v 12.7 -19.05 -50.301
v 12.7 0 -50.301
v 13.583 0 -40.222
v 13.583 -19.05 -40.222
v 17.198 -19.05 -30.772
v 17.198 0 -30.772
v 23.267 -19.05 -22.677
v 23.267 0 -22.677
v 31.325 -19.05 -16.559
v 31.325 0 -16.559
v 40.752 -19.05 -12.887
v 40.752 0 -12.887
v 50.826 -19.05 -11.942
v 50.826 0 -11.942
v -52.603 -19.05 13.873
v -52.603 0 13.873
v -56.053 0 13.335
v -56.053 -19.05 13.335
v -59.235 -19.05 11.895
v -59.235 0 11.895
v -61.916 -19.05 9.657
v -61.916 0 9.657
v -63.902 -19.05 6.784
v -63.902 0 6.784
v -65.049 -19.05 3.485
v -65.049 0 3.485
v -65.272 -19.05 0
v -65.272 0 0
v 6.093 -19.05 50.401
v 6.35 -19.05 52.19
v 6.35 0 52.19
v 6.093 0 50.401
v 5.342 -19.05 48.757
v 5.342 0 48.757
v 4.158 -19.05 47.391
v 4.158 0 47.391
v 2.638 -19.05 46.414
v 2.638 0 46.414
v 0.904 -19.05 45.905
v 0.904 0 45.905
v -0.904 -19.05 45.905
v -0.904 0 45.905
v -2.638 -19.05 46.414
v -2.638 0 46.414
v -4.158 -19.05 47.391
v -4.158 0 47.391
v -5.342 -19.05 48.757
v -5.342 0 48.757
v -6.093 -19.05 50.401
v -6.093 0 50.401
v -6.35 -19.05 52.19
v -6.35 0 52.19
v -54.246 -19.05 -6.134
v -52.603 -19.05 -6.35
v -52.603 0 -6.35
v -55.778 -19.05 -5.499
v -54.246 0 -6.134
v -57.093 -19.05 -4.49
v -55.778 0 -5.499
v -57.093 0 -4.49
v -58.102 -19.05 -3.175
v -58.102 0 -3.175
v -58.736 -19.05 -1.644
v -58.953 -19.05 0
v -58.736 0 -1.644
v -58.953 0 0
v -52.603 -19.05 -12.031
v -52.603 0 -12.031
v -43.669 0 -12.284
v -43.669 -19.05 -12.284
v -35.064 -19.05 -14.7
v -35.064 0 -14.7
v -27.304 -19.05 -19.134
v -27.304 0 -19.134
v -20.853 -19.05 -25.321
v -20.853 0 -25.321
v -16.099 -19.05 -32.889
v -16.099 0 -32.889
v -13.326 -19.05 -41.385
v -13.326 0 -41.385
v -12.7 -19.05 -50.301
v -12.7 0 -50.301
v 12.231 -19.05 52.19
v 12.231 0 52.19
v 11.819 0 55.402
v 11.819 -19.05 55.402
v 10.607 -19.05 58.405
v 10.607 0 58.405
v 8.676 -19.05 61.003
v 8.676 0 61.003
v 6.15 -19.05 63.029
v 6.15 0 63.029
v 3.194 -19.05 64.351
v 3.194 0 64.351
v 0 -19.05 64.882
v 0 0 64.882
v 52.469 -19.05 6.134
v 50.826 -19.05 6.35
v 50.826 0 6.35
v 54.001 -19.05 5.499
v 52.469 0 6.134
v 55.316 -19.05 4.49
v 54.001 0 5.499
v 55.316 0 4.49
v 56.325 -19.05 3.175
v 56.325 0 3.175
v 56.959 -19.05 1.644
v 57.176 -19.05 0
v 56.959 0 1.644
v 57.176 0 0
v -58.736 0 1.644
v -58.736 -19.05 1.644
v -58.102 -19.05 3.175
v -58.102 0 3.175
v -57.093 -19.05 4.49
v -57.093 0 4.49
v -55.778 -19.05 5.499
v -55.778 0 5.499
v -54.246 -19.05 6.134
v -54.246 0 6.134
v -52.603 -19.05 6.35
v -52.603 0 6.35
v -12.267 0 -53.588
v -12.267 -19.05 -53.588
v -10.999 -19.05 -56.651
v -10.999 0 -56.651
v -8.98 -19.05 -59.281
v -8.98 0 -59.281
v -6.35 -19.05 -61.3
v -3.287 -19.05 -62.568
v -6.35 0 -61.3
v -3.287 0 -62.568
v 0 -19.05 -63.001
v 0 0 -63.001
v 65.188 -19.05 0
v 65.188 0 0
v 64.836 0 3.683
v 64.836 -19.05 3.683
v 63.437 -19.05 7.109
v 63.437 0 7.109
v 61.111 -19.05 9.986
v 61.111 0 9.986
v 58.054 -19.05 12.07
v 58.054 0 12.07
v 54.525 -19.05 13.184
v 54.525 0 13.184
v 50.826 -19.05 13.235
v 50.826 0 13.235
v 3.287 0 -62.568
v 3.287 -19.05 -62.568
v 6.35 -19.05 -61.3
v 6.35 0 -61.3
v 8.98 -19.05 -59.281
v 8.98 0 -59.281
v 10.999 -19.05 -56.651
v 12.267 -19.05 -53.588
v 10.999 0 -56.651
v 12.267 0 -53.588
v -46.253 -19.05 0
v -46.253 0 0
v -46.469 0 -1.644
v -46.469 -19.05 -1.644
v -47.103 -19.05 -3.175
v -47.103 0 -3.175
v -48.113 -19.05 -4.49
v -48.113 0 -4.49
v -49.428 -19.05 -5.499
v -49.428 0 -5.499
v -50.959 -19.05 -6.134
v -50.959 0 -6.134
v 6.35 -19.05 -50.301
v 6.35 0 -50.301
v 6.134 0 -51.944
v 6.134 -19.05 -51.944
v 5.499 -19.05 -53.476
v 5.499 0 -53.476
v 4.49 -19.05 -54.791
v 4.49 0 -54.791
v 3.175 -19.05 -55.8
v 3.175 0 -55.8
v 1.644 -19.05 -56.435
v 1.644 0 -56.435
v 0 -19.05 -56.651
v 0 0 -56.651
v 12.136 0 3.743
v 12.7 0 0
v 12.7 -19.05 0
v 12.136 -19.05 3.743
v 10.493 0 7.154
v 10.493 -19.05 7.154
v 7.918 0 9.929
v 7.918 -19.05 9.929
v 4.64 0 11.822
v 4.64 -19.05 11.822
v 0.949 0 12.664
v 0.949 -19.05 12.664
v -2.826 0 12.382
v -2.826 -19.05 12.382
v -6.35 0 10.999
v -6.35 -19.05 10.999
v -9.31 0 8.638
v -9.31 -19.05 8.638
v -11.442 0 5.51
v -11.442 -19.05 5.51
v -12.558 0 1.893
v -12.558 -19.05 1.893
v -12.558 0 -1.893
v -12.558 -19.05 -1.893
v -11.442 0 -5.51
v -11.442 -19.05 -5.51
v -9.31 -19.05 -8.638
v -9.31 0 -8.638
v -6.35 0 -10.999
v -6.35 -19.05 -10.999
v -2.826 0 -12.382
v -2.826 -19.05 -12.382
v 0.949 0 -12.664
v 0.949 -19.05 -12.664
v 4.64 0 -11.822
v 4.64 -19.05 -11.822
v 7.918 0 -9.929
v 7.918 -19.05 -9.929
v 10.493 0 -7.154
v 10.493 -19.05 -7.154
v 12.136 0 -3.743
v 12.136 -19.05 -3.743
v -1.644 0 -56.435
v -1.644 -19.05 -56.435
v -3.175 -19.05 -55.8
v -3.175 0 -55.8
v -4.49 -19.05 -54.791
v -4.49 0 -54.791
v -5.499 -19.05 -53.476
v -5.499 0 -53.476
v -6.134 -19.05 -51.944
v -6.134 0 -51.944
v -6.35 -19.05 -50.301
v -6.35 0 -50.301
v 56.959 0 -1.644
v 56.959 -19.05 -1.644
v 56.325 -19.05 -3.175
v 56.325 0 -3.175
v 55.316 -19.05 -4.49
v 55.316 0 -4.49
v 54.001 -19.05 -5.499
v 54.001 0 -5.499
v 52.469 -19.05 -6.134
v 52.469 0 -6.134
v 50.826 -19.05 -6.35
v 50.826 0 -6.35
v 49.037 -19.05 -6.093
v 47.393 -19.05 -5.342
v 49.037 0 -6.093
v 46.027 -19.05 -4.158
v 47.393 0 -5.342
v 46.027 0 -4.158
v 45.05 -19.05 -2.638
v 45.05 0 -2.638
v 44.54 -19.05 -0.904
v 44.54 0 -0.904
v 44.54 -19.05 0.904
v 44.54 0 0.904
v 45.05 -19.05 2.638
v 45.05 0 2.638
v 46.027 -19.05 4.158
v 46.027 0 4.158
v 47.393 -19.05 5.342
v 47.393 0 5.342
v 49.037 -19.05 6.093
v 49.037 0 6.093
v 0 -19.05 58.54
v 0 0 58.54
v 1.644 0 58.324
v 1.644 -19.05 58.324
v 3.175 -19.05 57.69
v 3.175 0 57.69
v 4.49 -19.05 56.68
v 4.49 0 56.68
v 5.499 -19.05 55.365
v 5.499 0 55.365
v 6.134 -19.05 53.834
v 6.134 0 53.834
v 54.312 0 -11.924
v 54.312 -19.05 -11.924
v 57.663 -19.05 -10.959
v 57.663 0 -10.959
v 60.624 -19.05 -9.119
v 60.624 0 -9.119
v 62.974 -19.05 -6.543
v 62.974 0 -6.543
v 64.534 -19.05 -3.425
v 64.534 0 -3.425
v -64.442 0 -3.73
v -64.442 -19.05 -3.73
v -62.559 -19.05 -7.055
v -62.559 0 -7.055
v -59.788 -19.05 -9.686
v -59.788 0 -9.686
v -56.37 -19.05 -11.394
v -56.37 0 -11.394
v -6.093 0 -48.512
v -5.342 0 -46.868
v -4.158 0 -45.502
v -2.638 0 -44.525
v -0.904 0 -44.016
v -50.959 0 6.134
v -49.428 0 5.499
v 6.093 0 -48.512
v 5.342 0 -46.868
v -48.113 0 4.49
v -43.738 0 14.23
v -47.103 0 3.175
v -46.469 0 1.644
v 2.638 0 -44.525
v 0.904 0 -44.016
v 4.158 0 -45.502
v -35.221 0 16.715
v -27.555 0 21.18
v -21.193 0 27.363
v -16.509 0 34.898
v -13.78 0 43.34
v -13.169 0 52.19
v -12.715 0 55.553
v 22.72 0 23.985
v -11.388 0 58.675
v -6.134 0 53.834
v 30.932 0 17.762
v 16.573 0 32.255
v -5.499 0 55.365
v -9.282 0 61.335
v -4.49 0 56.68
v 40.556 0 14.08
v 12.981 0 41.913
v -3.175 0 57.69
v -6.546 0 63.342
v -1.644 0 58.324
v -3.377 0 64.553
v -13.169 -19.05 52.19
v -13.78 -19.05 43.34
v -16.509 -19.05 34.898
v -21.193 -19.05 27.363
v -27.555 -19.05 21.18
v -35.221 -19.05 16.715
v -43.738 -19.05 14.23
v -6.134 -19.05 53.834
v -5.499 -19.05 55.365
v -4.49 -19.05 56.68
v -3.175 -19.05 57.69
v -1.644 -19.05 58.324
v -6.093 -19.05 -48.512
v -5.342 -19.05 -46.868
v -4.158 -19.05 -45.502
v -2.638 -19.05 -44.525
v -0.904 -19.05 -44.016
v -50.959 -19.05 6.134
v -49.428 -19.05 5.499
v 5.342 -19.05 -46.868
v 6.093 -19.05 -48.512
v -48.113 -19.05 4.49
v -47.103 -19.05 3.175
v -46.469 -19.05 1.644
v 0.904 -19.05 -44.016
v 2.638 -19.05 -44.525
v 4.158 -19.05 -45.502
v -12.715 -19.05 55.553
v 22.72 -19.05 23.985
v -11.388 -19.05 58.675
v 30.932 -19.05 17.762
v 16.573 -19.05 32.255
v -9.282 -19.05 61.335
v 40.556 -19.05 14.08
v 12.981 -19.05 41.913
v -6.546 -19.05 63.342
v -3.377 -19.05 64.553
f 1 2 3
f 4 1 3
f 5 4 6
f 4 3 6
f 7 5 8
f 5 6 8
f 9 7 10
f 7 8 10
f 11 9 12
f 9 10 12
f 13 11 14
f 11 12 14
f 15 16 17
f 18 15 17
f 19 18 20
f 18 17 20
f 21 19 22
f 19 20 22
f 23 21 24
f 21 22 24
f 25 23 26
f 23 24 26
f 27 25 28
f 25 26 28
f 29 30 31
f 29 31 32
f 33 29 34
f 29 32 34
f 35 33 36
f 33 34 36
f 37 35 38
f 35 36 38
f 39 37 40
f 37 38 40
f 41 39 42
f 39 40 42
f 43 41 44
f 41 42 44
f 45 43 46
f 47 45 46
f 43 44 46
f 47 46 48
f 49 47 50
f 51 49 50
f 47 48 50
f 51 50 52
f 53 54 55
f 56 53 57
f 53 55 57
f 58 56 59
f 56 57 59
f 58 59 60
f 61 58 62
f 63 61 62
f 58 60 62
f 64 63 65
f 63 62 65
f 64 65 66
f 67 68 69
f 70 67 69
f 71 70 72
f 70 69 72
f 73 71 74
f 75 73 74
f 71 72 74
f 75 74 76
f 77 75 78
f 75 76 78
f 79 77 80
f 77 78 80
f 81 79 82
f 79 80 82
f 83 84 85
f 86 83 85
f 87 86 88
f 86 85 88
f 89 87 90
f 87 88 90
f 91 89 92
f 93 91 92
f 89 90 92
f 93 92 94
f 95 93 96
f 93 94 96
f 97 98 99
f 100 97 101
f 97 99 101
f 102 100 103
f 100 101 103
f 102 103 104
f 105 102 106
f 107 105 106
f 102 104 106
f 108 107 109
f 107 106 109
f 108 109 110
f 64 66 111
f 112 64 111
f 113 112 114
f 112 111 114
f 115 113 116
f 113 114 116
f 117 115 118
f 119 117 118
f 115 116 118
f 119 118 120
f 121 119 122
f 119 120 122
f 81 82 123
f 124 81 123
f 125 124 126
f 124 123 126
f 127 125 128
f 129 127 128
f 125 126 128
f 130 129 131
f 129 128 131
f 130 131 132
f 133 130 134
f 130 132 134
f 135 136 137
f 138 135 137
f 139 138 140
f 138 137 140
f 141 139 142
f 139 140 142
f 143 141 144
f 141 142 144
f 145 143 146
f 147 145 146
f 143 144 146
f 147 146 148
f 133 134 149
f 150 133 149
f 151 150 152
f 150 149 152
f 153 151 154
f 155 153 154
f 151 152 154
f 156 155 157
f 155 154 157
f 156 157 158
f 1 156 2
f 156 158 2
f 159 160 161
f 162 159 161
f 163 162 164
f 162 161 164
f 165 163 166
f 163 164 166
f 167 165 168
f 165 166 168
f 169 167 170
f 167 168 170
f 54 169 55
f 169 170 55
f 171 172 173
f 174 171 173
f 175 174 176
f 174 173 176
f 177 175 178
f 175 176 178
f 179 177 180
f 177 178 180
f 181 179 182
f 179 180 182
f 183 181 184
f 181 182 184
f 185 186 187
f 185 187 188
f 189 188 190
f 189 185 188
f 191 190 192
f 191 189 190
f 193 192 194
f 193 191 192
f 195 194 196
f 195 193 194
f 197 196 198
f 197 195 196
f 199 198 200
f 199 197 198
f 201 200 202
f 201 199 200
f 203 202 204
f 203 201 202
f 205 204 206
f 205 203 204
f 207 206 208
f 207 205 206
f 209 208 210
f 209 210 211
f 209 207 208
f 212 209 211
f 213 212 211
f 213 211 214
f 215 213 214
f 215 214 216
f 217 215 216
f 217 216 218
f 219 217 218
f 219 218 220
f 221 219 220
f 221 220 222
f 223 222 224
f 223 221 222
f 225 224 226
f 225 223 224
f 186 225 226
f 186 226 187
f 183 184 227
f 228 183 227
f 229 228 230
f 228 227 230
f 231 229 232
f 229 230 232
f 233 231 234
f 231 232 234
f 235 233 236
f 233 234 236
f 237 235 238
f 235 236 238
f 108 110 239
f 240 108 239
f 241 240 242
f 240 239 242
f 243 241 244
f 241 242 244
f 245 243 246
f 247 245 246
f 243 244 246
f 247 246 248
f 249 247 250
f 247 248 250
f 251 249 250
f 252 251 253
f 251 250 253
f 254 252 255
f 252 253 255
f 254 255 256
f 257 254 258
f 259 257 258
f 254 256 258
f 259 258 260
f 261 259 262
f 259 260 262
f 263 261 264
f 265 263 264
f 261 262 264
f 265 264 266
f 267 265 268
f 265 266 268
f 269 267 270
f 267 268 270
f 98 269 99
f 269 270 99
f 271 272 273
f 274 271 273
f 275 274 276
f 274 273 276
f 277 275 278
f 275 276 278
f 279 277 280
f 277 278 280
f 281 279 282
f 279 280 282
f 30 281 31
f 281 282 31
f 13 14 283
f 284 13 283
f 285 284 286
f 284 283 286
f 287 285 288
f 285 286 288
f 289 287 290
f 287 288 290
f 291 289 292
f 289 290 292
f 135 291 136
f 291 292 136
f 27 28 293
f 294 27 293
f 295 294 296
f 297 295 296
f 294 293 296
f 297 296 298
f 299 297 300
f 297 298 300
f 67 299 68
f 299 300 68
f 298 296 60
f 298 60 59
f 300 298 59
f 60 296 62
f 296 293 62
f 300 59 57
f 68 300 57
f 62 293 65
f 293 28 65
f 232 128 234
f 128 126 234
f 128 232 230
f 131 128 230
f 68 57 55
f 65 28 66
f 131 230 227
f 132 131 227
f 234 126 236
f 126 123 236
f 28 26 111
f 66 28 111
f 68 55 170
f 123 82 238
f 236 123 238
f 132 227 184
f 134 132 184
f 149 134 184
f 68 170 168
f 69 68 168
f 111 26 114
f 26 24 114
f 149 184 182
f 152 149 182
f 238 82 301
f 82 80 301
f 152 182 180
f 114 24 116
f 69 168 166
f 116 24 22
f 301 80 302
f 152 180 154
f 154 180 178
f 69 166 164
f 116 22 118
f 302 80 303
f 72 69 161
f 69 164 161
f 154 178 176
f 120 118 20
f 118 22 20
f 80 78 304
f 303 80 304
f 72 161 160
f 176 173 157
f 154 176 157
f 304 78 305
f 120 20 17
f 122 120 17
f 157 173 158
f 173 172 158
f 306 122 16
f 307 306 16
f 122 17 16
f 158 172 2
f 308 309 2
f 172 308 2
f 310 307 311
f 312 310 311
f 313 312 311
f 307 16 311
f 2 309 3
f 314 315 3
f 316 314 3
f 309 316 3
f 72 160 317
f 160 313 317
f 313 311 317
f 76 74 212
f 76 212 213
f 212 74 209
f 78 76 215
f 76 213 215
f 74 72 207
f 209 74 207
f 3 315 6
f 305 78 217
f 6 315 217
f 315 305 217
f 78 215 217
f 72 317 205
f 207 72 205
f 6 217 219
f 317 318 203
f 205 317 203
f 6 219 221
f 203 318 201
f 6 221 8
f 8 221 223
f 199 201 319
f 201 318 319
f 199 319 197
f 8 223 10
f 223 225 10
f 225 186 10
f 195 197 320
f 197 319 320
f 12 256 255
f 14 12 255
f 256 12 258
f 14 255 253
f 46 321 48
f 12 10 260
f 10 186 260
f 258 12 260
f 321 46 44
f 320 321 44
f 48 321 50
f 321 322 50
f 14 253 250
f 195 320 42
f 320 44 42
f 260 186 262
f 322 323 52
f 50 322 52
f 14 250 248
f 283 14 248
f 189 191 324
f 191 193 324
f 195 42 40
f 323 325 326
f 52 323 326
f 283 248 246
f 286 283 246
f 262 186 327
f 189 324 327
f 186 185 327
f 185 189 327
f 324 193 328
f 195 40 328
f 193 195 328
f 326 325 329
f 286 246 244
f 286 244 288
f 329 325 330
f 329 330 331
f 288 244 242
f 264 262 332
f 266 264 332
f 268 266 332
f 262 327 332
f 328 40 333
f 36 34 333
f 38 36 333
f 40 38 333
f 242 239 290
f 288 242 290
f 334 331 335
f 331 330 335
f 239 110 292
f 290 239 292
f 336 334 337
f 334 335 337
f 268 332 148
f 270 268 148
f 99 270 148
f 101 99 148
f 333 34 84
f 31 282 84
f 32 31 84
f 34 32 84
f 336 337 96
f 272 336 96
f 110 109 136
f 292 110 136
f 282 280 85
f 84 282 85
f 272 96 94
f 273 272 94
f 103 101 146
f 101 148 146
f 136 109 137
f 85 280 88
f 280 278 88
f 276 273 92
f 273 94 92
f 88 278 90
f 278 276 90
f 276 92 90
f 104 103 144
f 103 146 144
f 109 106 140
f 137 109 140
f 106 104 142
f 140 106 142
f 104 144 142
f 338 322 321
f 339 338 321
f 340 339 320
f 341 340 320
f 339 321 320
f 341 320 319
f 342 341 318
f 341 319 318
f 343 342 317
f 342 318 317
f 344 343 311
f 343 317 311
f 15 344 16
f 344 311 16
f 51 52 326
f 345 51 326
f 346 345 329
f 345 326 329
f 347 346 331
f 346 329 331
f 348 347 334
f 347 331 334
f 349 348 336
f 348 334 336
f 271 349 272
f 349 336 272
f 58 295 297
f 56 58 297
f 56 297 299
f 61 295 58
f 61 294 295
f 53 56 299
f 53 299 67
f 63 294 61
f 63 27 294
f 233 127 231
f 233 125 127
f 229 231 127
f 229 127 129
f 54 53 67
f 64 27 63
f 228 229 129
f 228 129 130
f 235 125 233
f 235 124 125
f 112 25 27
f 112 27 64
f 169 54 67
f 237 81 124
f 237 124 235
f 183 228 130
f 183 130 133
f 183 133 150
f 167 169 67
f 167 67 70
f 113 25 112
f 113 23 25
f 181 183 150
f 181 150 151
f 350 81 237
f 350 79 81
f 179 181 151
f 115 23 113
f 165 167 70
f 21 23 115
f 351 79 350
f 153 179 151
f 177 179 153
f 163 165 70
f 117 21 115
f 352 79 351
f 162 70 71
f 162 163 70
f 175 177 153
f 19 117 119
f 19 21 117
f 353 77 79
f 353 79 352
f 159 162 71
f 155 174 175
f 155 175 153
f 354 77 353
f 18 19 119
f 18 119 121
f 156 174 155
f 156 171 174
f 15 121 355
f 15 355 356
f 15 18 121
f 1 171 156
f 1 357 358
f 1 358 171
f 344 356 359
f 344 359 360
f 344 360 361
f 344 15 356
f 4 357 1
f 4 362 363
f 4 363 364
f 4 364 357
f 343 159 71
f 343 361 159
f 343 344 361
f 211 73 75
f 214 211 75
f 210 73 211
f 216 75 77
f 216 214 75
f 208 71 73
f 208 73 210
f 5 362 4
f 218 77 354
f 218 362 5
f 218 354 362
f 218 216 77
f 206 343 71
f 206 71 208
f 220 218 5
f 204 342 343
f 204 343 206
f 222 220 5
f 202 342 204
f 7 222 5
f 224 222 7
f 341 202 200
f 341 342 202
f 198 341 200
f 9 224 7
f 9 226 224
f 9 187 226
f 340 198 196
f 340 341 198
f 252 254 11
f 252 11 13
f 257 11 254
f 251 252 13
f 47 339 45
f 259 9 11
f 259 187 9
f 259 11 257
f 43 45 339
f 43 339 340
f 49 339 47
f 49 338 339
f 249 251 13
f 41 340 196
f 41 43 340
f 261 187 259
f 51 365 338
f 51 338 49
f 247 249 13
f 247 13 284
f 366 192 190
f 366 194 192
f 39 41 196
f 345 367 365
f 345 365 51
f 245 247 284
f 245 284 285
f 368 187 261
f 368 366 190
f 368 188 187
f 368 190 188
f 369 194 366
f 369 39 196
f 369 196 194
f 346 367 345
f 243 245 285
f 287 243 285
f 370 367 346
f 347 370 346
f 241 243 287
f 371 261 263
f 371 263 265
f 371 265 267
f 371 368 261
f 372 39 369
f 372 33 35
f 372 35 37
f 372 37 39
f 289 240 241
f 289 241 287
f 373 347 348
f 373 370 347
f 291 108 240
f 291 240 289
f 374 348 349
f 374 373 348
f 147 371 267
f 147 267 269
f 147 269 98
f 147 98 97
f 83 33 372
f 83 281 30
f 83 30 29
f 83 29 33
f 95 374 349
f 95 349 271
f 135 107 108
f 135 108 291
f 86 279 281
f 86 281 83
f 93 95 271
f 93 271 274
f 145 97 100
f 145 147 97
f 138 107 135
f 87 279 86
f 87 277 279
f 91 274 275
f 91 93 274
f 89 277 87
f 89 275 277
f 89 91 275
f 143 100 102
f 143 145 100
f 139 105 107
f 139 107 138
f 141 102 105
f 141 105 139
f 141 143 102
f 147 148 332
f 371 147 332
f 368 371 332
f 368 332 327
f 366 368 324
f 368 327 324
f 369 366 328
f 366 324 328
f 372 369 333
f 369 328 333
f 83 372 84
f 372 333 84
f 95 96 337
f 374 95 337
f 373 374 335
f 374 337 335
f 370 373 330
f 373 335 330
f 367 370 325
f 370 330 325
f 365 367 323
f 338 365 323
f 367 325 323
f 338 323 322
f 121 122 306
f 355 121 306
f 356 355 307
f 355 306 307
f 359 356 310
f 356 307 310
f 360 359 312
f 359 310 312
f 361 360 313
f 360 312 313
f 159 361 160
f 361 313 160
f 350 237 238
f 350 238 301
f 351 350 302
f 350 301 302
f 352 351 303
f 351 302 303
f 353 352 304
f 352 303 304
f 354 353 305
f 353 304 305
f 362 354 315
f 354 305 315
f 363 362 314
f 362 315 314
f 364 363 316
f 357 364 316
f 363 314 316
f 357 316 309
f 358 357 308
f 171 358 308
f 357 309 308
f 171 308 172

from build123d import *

# Parameters (mm, degrees)
F0_R     = 12.7
F1_DEPTH = 19.05


with BuildPart() as f1:
    # F0 (on Front) → F1 (new body)
    with BuildSketch(Plane.XZ):
        with BuildLine():
            Line((12.23147, 52.190307), (6.35, 52.190307))
            ThreePointArc((6.35, 52.190307), (0, 45.840307), (-6.35, 52.190307))
            Line((-6.35, 52.190307), (-13.16853, 52.190307))
            ThreePointArc((-13.16853, 52.190307), (-24.185423, 24.077807), (-52.602746, 13.872888))
            Line((-52.602746, 13.872888), (-52.602746, 6.35))
            ThreePointArc((-52.602746, 6.35), (-48.112618, 4.490128), (-46.252746, 0))
            ThreePointArc((-46.252746, 0), (-48.112618, -4.490128), (-52.602746, -6.35))
            Line((-52.602746, -6.35), (-52.602746, -12.031119))
            ThreePointArc((-52.602746, -12.031119), (-23.888564, -22.029354), (-12.7, -50.300982))
            Line((-12.7, -50.300982), (-6.35, -50.300982))
            ThreePointArc((-6.35, -50.300982), (0, -43.950982), (6.35, -50.300982))
            Line((6.35, -50.300982), (12.7, -50.300982))
            ThreePointArc((12.7, -50.300982), (23.267131, -22.677459), (50.825791, -11.942305))
            Line((50.825791, -11.942305), (50.825791, -6.35))
            ThreePointArc((50.825791, -6.35), (44.475791, 0), (50.825791, 6.35))
            Line((50.825791, 6.35), (50.825791, 13.234786))
            ThreePointArc((50.825791, 13.234786), (22.719563, 23.985158), (12.23147, 52.190307))
        make_face()
        Circle(F0_R, mode=Mode.SUBTRACT)
        with BuildLine():
            ThreePointArc((0, 58.540307), (4.490128, 56.680435), (6.35, 52.190307))
            Line((6.35, 52.190307), (12.23147, 52.190307))
            ThreePointArc((12.23147, 52.190307), (8.675876, 61.003356), (0, 64.881661))
            Line((0, 64.881661), (0, 58.540307))
        make_face()
        with BuildLine():
            ThreePointArc((-6.35, 52.190307), (-4.490128, 56.680435), (0, 58.540307))
            Line((0, 58.540307), (0, 64.881661))
            ThreePointArc((0, 64.881661), (-9.281579, 61.334713), (-13.16853, 52.190307))
            Line((-13.16853, 52.190307), (-6.35, 52.190307))
        make_face()
        with BuildLine():
            ThreePointArc((65.188185, 0), (61.110783, 9.985633), (50.825791, 13.234786))
            Line((50.825791, 13.234786), (50.825791, 6.35))
            ThreePointArc((50.825791, 6.35), (55.315919, 4.490128), (57.175791, 0))
            Line((57.175791, 0), (65.188185, 0))
        make_face()
        with BuildLine():
            Line((-52.602746, 6.35), (-52.602746, 13.872888))
            ThreePointArc((-52.602746, 13.872888), (-61.916345, 9.656853), (-65.272424, 0))
            Line((-65.272424, 0), (-58.952746, 0))
            ThreePointArc((-58.952746, 0), (-57.092874, 4.490128), (-52.602746, 6.35))
        make_face()
        with BuildLine():
            ThreePointArc((50.825791, -11.942305), (60.624398, -9.118977), (65.188185, 0))
            Line((65.188185, 0), (57.175791, 0))
            ThreePointArc((57.175791, 0), (55.315919, -4.490128), (50.825791, -6.35))
            Line((50.825791, -6.35), (50.825791, -11.942305))
        make_face()
        with BuildLine():
            Line((-58.952746, 0), (-65.272424, 0))
            ThreePointArc((-65.272424, 0), (-61.271138, -8.472967), (-52.602746, -12.031119))
            Line((-52.602746, -12.031119), (-52.602746, -6.35))
            ThreePointArc((-52.602746, -6.35), (-57.092874, -4.490128), (-58.952746, 0))
        make_face()
        with BuildLine():
            ThreePointArc((0, -63.000982), (8.980256, -59.281238), (12.7, -50.300982))
            Line((12.7, -50.300982), (6.35, -50.300982))
            ThreePointArc((6.35, -50.300982), (4.490128, -54.79111), (0, -56.650982))
            Line((0, -56.650982), (0, -63.000982))
        make_face()
        with BuildLine():
            Line((-6.35, -50.300982), (-12.7, -50.300982))
            ThreePointArc((-12.7, -50.300982), (-8.980256, -59.281238), (0, -63.000982))
            Line((0, -63.000982), (0, -56.650982))
            ThreePointArc((0, -56.650982), (-4.490128, -54.79111), (-6.35, -50.300982))
        make_face()
    extrude(amount=F1_DEPTH)


solid = f1.part
